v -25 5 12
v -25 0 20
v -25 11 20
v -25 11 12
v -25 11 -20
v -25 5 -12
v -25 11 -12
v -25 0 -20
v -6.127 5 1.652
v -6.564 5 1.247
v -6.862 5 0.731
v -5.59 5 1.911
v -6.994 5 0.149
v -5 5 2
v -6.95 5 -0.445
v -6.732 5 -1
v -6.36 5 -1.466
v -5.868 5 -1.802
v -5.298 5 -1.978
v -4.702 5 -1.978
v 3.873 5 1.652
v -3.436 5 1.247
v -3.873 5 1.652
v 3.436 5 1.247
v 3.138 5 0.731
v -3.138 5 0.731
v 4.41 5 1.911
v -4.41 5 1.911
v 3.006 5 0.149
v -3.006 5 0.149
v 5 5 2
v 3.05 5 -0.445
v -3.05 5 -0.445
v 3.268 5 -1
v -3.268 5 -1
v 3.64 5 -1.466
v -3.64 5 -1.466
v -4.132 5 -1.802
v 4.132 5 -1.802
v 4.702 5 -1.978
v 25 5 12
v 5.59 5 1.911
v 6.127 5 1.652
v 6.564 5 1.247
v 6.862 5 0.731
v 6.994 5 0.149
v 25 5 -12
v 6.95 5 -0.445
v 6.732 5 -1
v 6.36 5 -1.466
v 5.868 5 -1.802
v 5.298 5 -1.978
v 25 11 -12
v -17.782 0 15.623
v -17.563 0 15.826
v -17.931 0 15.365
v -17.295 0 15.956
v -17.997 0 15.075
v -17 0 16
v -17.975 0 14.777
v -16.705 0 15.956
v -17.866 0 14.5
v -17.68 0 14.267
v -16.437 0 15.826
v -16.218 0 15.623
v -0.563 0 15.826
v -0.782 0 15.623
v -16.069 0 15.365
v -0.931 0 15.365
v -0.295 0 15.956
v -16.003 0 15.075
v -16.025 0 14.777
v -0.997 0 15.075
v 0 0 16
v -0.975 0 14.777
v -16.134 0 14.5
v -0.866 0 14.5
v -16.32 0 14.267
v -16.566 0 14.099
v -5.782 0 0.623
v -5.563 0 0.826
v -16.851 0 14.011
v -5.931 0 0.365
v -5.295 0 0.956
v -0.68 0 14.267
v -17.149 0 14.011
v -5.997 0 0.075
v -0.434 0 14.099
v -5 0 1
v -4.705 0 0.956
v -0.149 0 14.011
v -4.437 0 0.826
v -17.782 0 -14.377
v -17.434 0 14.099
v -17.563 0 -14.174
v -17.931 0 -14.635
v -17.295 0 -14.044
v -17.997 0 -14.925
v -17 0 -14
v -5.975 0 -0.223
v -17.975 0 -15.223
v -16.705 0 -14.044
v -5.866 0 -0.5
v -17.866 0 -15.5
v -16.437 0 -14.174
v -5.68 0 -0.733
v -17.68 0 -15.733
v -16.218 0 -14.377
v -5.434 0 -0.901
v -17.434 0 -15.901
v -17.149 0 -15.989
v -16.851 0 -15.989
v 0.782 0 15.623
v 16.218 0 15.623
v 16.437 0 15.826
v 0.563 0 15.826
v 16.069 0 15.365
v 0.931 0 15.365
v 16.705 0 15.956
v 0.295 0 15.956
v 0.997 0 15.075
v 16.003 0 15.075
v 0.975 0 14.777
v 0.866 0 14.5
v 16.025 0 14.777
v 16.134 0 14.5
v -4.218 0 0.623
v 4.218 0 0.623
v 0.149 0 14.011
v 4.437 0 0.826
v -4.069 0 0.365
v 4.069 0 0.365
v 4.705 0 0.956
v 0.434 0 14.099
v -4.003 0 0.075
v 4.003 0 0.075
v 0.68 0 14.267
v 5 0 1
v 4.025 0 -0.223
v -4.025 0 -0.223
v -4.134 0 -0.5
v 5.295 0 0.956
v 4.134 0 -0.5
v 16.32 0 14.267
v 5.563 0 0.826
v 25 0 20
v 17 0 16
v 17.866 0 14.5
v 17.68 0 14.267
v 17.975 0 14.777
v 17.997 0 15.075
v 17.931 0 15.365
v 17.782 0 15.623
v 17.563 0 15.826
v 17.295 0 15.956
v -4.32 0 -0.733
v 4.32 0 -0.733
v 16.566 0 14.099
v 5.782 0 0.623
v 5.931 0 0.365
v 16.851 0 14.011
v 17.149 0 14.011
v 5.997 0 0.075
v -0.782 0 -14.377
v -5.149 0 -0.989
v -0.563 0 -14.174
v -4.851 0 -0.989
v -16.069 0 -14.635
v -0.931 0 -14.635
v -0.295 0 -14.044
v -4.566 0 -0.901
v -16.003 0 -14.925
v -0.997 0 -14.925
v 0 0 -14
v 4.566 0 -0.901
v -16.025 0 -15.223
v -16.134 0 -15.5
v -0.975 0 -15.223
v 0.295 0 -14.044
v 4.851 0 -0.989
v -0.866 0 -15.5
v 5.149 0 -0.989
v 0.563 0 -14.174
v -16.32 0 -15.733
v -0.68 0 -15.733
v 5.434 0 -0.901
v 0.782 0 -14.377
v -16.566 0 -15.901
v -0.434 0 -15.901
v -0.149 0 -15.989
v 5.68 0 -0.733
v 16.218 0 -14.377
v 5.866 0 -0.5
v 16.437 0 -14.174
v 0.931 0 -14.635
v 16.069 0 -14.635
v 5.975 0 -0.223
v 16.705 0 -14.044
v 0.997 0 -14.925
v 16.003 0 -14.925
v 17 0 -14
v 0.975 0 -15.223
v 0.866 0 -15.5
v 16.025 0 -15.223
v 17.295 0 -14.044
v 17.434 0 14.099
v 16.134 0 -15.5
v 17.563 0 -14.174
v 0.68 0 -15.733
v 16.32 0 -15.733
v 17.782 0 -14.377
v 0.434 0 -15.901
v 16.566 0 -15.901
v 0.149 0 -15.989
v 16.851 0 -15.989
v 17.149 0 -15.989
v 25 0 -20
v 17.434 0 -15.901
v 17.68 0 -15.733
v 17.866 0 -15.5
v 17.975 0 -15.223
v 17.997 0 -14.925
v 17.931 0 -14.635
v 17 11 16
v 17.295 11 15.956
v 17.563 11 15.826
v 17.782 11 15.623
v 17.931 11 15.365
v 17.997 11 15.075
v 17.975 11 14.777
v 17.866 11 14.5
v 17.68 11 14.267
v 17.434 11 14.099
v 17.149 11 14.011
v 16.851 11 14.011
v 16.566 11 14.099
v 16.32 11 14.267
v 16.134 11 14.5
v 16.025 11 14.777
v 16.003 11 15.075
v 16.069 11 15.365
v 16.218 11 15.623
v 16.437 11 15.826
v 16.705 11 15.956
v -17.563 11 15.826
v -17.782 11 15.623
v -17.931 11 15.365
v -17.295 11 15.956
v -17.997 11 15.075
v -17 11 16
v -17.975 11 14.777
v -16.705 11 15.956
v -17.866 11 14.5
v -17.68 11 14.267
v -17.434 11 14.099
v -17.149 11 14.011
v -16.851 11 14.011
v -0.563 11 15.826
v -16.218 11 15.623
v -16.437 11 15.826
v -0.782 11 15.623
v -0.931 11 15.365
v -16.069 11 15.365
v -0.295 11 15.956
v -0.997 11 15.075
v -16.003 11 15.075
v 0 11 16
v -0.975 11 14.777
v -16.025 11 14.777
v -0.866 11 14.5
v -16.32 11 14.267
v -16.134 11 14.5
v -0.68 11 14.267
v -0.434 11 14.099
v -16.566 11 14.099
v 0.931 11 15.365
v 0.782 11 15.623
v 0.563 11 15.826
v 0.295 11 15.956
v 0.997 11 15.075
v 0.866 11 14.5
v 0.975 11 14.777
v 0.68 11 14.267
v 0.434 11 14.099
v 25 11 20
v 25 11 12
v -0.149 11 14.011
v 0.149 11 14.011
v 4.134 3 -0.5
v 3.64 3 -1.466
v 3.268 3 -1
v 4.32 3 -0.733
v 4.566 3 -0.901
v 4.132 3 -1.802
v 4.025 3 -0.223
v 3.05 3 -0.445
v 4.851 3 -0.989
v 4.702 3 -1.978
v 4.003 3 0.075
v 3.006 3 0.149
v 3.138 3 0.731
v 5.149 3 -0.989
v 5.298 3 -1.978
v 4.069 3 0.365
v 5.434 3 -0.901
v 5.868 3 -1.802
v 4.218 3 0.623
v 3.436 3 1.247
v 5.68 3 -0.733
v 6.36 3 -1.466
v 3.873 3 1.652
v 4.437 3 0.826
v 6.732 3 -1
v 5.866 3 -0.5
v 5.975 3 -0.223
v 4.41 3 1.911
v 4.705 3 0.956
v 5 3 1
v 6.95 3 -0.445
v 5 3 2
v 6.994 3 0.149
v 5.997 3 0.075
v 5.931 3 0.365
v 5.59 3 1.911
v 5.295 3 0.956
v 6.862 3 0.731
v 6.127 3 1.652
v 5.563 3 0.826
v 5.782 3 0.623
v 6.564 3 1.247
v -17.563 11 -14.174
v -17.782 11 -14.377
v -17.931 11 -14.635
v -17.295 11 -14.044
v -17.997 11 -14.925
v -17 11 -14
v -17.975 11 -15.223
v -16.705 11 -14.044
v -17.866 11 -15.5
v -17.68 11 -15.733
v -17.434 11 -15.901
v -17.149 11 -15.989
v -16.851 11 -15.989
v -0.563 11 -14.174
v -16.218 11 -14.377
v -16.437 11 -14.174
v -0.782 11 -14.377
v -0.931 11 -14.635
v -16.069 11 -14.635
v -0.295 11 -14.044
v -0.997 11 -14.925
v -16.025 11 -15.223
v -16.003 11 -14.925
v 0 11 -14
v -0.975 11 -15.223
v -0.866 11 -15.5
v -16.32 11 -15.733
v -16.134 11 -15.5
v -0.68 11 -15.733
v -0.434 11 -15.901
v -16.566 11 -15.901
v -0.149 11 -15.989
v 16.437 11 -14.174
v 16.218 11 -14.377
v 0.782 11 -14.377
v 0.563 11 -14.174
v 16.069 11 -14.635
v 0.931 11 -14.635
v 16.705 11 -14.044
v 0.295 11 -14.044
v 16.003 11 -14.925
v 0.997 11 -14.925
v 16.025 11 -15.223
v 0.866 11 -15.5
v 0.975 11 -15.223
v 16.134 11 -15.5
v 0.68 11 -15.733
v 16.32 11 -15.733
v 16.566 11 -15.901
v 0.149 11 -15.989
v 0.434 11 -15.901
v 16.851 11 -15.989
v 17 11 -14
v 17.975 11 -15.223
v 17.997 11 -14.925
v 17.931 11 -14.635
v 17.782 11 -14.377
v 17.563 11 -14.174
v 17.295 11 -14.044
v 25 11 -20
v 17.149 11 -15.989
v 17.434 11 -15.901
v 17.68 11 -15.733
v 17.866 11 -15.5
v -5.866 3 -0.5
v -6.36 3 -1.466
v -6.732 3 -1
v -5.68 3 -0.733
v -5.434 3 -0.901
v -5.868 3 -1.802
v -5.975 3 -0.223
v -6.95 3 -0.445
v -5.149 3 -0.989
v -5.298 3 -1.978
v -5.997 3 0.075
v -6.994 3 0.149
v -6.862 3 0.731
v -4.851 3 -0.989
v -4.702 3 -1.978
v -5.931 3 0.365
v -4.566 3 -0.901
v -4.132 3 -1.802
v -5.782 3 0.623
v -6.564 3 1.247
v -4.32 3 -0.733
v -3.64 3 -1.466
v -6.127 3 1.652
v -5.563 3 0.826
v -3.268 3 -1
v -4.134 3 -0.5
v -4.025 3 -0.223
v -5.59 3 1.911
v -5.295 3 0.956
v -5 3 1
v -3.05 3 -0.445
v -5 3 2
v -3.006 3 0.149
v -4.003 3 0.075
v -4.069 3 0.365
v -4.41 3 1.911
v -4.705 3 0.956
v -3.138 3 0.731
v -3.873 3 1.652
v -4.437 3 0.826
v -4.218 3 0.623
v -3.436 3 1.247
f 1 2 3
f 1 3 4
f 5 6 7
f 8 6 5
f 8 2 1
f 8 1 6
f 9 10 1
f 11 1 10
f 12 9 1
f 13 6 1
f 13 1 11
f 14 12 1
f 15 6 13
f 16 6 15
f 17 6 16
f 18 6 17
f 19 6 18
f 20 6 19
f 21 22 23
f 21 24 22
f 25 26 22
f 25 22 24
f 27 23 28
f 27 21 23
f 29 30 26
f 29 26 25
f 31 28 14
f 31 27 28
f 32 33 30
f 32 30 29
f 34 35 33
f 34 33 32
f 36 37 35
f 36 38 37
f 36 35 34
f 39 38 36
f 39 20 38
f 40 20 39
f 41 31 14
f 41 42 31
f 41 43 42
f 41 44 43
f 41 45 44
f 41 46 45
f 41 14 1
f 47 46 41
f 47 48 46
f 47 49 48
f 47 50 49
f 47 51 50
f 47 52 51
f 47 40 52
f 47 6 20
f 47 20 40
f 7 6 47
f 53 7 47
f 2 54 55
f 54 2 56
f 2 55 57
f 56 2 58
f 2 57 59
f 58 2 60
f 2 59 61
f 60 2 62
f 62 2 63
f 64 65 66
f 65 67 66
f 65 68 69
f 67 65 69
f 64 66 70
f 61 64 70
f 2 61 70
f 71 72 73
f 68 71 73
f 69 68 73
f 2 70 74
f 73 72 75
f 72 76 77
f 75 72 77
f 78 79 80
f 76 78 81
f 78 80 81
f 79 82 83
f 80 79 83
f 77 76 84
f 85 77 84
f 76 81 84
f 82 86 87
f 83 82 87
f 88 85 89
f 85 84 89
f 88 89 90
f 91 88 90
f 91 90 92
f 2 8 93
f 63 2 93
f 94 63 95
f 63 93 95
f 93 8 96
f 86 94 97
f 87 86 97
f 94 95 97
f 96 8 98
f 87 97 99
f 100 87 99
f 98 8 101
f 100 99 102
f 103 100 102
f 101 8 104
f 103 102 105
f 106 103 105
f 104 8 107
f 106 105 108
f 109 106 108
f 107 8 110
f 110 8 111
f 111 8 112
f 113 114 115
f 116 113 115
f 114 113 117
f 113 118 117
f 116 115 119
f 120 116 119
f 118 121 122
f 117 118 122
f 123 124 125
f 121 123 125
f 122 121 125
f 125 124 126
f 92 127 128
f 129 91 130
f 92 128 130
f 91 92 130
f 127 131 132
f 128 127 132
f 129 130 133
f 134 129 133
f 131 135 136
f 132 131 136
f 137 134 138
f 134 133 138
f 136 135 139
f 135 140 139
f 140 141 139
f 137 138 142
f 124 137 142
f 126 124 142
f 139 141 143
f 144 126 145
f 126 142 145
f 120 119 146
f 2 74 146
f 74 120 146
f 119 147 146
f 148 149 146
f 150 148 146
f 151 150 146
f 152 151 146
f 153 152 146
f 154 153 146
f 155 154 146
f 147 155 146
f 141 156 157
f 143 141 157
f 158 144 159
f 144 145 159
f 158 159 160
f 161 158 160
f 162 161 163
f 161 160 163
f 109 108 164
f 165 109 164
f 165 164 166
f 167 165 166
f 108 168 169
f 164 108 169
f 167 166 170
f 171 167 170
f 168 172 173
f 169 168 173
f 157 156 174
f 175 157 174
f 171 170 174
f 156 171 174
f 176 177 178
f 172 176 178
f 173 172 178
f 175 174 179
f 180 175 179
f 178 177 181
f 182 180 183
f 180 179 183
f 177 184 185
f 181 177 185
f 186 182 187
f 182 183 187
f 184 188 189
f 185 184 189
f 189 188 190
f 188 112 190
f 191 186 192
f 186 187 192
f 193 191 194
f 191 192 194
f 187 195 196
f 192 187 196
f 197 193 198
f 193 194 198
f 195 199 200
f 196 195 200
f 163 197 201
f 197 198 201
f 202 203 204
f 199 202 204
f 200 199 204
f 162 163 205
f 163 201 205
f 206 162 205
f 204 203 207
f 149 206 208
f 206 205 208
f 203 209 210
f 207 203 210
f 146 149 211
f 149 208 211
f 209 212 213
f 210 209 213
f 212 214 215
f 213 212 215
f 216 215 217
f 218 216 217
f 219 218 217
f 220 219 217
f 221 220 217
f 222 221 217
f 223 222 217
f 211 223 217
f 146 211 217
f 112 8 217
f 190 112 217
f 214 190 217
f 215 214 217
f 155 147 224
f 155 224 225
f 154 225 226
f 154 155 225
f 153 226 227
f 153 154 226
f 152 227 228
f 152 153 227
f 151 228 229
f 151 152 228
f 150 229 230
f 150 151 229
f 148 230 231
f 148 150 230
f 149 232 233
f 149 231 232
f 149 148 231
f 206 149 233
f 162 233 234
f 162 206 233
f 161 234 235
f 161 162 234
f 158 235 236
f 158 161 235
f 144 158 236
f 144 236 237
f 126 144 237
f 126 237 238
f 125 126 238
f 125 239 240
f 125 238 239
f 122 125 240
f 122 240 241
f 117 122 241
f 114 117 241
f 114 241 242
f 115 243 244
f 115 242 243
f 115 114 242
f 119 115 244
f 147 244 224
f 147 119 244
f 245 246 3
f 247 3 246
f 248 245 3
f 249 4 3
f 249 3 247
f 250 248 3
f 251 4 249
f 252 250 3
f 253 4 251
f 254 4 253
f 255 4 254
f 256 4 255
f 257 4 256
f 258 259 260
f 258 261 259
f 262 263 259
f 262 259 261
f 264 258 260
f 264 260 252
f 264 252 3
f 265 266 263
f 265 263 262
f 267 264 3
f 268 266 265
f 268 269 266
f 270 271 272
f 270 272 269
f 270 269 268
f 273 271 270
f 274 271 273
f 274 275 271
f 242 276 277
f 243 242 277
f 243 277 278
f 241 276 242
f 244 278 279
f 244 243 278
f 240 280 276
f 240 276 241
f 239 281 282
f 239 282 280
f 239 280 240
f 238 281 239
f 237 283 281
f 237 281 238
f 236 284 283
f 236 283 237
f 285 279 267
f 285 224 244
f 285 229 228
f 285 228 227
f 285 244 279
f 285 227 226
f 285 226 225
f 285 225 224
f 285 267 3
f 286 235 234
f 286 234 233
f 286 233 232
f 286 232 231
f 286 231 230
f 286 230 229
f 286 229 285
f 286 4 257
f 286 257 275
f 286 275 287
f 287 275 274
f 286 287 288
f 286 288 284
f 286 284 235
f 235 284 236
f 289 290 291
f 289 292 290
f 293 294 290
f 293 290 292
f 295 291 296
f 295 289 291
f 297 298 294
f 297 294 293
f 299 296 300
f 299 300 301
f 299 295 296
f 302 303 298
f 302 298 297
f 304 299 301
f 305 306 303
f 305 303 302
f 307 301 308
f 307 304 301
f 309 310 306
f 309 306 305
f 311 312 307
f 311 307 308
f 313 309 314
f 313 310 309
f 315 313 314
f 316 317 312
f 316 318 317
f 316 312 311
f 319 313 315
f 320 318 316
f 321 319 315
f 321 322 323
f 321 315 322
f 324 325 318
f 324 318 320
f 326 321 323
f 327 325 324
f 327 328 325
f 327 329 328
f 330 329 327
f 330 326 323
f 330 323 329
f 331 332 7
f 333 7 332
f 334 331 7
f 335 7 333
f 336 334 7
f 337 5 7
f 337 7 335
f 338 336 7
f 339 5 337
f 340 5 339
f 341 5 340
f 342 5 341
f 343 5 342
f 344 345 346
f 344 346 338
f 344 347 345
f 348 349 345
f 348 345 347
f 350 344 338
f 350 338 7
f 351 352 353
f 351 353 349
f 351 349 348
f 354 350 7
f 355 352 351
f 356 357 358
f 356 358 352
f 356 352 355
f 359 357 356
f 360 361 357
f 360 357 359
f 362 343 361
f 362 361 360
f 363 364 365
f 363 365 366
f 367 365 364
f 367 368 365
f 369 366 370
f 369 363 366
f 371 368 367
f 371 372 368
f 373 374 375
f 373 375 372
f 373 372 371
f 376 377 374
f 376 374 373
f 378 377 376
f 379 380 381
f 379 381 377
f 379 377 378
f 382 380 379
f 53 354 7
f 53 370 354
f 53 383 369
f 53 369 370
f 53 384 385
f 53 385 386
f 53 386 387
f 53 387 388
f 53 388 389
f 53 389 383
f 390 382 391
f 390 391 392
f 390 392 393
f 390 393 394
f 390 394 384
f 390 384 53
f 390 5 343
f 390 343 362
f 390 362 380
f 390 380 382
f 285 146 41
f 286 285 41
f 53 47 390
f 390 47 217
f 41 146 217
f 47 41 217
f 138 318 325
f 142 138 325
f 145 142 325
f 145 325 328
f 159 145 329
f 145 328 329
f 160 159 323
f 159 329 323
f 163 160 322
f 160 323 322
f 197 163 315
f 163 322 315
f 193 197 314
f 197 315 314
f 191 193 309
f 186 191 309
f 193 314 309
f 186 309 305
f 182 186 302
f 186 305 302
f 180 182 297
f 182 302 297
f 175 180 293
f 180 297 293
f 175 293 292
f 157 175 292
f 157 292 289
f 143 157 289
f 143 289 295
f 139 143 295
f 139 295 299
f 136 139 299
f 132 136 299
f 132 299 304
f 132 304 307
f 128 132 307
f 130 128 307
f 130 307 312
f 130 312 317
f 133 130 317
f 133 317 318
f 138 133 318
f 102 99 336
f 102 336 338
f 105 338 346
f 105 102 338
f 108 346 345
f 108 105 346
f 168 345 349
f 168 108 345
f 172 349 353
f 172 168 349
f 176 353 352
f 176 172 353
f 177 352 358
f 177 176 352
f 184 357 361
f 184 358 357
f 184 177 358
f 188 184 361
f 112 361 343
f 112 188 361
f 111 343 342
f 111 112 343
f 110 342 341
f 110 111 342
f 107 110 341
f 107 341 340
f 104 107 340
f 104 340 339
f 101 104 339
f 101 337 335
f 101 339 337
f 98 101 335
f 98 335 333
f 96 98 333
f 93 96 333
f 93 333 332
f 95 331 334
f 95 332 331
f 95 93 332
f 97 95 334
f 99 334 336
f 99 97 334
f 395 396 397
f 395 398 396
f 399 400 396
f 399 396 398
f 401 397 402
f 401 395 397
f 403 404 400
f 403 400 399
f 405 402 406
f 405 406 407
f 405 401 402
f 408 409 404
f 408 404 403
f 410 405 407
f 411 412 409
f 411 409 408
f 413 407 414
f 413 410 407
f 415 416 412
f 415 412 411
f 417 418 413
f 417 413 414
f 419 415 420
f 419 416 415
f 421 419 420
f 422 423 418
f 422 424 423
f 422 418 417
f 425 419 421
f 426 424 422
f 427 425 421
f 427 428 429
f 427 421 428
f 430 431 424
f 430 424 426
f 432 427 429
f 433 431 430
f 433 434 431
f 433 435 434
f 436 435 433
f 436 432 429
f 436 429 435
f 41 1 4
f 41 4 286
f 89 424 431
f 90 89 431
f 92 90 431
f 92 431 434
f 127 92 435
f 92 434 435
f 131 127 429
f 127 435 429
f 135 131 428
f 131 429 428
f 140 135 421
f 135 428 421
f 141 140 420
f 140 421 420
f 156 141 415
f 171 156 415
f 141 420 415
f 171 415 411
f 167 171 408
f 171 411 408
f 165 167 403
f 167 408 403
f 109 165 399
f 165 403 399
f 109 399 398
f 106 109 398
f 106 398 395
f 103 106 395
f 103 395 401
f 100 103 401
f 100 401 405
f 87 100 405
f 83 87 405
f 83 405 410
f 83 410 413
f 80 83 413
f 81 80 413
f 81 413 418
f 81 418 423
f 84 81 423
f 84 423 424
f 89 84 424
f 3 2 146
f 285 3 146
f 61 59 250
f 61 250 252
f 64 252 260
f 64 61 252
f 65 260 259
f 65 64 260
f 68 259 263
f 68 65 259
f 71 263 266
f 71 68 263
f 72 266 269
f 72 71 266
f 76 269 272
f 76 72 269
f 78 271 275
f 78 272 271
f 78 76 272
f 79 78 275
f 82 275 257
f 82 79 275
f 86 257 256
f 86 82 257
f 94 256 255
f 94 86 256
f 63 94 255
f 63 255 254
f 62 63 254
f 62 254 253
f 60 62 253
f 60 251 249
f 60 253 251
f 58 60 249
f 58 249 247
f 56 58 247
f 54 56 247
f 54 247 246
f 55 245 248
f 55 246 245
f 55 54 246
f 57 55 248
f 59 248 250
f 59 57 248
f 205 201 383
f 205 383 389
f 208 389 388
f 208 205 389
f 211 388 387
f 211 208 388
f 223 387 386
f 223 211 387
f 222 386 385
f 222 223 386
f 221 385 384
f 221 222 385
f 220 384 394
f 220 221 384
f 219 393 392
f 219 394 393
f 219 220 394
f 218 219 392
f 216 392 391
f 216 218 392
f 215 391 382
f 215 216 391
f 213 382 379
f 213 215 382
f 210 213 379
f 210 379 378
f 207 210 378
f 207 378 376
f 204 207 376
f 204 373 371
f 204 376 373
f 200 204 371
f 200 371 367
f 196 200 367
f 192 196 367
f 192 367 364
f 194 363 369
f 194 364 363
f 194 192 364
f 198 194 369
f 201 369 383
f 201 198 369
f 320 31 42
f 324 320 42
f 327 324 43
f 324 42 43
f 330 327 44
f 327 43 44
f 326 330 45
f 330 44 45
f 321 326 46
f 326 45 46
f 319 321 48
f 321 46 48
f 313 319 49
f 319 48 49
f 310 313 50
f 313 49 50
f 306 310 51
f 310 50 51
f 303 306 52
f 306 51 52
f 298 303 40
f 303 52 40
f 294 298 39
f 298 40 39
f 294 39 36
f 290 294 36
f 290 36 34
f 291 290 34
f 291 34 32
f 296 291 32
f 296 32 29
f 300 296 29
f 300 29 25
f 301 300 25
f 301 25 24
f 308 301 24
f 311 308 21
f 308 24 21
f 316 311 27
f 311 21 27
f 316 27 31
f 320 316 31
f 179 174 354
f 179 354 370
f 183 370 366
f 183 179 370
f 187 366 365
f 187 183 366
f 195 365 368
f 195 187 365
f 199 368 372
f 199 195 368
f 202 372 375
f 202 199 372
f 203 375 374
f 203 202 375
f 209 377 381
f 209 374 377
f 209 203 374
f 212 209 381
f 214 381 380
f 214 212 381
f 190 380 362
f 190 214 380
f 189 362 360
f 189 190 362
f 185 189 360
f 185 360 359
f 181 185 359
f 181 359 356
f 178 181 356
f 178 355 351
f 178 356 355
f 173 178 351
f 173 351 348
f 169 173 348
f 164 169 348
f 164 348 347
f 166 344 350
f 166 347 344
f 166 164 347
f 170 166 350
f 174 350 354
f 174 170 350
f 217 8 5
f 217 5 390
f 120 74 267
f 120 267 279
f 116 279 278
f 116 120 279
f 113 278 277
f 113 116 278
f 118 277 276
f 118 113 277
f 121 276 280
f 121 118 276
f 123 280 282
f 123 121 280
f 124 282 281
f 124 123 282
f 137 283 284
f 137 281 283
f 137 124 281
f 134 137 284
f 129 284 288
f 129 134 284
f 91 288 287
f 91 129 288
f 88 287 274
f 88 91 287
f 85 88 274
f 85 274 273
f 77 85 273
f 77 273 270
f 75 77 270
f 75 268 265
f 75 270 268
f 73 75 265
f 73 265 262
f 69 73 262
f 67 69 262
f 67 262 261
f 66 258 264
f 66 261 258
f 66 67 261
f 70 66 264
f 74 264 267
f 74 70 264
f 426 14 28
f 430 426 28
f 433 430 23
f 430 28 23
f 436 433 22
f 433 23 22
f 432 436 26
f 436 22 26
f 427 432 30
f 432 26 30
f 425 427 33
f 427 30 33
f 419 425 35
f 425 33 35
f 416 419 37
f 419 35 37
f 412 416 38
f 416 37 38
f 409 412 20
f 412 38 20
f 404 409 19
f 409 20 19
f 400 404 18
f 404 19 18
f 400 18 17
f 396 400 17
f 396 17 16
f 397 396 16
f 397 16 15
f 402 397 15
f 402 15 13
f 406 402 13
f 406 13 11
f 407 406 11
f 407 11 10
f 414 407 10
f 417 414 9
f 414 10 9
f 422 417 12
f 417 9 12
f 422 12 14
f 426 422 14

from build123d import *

# Parameters (mm, degrees)
SKETCH1_W               = 50
SKETCH1_H               = 40
BOSS_EXTRUDE1_DEPTH     = 5
SKETCH2_R               = 1
CUT_EXTRUDE1_DEPTH      = 33.403703492
SKETCH3_R               = 2
CUT_EXTRUDE2_DEPTH      = 2
SKETCH5_W               = 50
SKETCH5_H               = 8
BOSS_EXTRUDE2_DEPTH     = 6
CUT_EXTRUDE3_DEPTH      = 33.57299495
CUT_EXTRUDE3_DEPTH_BACK = 33.57299495
SKETCH4_R               = 1


with BuildPart() as part:
    # Sketch1 → Boss-Extrude1 (new body)
    with BuildSketch(Plane(origin=(0, 0, 0), x_dir=(1, 0, 0), z_dir=(0, 1, 0))):
        Rectangle(SKETCH1_W, SKETCH1_H)
    extrude(amount=BOSS_EXTRUDE1_DEPTH)

    # Sketch2 → Cut-Extrude1 (cut, through all)
    with BuildSketch(Plane(origin=(0, 5, 0), x_dir=(1, 0, 0), z_dir=(0, 1, 0))):
        with Locations(Location((-5, 0, 0), (0, 0, 270))):
            Circle(SKETCH2_R)
        with Locations(Location((5, 0, 0), (0, 0, 270))):
            Circle(SKETCH2_R)
    extrude(amount=-CUT_EXTRUDE1_DEPTH, mode=Mode.SUBTRACT)

    # Sketch3 → Cut-Extrude2 (cut)
    with BuildSketch(Plane(origin=(0, 5, 0), x_dir=(1, 0, 0), z_dir=(0, 1, 0))):
        with Locations(Location((-5, 0, 0), (0, 0, 270))):
            Circle(SKETCH3_R)
        with Locations(Location((5, 0, 0), (0, 0, 270))):
            Circle(SKETCH3_R)
    extrude(amount=-CUT_EXTRUDE2_DEPTH, mode=Mode.SUBTRACT)

    # Sketch5 → Boss-Extrude2 (add)
    with BuildSketch(Plane(origin=(0, 5, 0), x_dir=(1, 0, 0), z_dir=(0, 1, 0))):
        with Locations((0, 16)):
            Rectangle(SKETCH5_W, SKETCH5_H)
        with Locations((0, -16)):
            Rectangle(SKETCH5_W, SKETCH5_H)
    extrude(amount=BOSS_EXTRUDE2_DEPTH)

    # Sketch4 → Cut-Extrude3 (cut, two sides: drawn at the far end of the back side and taken through both)
    with BuildSketch(Plane(origin=(0, 5, 0), x_dir=(1, 0, 0), z_dir=(0, 1, 0)).offset(-CUT_EXTRUDE3_DEPTH_BACK)):
        with Locations(Location((-17, 15, 0), (0, 0, 270))):
            Circle(SKETCH4_R)
        with Locations(Location((0, 15, 0), (0, 0, 270))):
            Circle(SKETCH4_R)
        with Locations(Location((17, 15, 0), (0, 0, 270))):
            Circle(SKETCH4_R)
        with Locations(Location((-17, -15, 0), (0, 0, 270))):
            Circle(SKETCH4_R)
        with Locations(Location((0, -15, 0), (0, 0, 270))):
            Circle(SKETCH4_R)
        with Locations(Location((17, -15, 0), (0, 0, 270))):
            Circle(SKETCH4_R)
    extrude(amount=CUT_EXTRUDE3_DEPTH + CUT_EXTRUDE3_DEPTH_BACK, mode=Mode.SUBTRACT)


solid = part.part
